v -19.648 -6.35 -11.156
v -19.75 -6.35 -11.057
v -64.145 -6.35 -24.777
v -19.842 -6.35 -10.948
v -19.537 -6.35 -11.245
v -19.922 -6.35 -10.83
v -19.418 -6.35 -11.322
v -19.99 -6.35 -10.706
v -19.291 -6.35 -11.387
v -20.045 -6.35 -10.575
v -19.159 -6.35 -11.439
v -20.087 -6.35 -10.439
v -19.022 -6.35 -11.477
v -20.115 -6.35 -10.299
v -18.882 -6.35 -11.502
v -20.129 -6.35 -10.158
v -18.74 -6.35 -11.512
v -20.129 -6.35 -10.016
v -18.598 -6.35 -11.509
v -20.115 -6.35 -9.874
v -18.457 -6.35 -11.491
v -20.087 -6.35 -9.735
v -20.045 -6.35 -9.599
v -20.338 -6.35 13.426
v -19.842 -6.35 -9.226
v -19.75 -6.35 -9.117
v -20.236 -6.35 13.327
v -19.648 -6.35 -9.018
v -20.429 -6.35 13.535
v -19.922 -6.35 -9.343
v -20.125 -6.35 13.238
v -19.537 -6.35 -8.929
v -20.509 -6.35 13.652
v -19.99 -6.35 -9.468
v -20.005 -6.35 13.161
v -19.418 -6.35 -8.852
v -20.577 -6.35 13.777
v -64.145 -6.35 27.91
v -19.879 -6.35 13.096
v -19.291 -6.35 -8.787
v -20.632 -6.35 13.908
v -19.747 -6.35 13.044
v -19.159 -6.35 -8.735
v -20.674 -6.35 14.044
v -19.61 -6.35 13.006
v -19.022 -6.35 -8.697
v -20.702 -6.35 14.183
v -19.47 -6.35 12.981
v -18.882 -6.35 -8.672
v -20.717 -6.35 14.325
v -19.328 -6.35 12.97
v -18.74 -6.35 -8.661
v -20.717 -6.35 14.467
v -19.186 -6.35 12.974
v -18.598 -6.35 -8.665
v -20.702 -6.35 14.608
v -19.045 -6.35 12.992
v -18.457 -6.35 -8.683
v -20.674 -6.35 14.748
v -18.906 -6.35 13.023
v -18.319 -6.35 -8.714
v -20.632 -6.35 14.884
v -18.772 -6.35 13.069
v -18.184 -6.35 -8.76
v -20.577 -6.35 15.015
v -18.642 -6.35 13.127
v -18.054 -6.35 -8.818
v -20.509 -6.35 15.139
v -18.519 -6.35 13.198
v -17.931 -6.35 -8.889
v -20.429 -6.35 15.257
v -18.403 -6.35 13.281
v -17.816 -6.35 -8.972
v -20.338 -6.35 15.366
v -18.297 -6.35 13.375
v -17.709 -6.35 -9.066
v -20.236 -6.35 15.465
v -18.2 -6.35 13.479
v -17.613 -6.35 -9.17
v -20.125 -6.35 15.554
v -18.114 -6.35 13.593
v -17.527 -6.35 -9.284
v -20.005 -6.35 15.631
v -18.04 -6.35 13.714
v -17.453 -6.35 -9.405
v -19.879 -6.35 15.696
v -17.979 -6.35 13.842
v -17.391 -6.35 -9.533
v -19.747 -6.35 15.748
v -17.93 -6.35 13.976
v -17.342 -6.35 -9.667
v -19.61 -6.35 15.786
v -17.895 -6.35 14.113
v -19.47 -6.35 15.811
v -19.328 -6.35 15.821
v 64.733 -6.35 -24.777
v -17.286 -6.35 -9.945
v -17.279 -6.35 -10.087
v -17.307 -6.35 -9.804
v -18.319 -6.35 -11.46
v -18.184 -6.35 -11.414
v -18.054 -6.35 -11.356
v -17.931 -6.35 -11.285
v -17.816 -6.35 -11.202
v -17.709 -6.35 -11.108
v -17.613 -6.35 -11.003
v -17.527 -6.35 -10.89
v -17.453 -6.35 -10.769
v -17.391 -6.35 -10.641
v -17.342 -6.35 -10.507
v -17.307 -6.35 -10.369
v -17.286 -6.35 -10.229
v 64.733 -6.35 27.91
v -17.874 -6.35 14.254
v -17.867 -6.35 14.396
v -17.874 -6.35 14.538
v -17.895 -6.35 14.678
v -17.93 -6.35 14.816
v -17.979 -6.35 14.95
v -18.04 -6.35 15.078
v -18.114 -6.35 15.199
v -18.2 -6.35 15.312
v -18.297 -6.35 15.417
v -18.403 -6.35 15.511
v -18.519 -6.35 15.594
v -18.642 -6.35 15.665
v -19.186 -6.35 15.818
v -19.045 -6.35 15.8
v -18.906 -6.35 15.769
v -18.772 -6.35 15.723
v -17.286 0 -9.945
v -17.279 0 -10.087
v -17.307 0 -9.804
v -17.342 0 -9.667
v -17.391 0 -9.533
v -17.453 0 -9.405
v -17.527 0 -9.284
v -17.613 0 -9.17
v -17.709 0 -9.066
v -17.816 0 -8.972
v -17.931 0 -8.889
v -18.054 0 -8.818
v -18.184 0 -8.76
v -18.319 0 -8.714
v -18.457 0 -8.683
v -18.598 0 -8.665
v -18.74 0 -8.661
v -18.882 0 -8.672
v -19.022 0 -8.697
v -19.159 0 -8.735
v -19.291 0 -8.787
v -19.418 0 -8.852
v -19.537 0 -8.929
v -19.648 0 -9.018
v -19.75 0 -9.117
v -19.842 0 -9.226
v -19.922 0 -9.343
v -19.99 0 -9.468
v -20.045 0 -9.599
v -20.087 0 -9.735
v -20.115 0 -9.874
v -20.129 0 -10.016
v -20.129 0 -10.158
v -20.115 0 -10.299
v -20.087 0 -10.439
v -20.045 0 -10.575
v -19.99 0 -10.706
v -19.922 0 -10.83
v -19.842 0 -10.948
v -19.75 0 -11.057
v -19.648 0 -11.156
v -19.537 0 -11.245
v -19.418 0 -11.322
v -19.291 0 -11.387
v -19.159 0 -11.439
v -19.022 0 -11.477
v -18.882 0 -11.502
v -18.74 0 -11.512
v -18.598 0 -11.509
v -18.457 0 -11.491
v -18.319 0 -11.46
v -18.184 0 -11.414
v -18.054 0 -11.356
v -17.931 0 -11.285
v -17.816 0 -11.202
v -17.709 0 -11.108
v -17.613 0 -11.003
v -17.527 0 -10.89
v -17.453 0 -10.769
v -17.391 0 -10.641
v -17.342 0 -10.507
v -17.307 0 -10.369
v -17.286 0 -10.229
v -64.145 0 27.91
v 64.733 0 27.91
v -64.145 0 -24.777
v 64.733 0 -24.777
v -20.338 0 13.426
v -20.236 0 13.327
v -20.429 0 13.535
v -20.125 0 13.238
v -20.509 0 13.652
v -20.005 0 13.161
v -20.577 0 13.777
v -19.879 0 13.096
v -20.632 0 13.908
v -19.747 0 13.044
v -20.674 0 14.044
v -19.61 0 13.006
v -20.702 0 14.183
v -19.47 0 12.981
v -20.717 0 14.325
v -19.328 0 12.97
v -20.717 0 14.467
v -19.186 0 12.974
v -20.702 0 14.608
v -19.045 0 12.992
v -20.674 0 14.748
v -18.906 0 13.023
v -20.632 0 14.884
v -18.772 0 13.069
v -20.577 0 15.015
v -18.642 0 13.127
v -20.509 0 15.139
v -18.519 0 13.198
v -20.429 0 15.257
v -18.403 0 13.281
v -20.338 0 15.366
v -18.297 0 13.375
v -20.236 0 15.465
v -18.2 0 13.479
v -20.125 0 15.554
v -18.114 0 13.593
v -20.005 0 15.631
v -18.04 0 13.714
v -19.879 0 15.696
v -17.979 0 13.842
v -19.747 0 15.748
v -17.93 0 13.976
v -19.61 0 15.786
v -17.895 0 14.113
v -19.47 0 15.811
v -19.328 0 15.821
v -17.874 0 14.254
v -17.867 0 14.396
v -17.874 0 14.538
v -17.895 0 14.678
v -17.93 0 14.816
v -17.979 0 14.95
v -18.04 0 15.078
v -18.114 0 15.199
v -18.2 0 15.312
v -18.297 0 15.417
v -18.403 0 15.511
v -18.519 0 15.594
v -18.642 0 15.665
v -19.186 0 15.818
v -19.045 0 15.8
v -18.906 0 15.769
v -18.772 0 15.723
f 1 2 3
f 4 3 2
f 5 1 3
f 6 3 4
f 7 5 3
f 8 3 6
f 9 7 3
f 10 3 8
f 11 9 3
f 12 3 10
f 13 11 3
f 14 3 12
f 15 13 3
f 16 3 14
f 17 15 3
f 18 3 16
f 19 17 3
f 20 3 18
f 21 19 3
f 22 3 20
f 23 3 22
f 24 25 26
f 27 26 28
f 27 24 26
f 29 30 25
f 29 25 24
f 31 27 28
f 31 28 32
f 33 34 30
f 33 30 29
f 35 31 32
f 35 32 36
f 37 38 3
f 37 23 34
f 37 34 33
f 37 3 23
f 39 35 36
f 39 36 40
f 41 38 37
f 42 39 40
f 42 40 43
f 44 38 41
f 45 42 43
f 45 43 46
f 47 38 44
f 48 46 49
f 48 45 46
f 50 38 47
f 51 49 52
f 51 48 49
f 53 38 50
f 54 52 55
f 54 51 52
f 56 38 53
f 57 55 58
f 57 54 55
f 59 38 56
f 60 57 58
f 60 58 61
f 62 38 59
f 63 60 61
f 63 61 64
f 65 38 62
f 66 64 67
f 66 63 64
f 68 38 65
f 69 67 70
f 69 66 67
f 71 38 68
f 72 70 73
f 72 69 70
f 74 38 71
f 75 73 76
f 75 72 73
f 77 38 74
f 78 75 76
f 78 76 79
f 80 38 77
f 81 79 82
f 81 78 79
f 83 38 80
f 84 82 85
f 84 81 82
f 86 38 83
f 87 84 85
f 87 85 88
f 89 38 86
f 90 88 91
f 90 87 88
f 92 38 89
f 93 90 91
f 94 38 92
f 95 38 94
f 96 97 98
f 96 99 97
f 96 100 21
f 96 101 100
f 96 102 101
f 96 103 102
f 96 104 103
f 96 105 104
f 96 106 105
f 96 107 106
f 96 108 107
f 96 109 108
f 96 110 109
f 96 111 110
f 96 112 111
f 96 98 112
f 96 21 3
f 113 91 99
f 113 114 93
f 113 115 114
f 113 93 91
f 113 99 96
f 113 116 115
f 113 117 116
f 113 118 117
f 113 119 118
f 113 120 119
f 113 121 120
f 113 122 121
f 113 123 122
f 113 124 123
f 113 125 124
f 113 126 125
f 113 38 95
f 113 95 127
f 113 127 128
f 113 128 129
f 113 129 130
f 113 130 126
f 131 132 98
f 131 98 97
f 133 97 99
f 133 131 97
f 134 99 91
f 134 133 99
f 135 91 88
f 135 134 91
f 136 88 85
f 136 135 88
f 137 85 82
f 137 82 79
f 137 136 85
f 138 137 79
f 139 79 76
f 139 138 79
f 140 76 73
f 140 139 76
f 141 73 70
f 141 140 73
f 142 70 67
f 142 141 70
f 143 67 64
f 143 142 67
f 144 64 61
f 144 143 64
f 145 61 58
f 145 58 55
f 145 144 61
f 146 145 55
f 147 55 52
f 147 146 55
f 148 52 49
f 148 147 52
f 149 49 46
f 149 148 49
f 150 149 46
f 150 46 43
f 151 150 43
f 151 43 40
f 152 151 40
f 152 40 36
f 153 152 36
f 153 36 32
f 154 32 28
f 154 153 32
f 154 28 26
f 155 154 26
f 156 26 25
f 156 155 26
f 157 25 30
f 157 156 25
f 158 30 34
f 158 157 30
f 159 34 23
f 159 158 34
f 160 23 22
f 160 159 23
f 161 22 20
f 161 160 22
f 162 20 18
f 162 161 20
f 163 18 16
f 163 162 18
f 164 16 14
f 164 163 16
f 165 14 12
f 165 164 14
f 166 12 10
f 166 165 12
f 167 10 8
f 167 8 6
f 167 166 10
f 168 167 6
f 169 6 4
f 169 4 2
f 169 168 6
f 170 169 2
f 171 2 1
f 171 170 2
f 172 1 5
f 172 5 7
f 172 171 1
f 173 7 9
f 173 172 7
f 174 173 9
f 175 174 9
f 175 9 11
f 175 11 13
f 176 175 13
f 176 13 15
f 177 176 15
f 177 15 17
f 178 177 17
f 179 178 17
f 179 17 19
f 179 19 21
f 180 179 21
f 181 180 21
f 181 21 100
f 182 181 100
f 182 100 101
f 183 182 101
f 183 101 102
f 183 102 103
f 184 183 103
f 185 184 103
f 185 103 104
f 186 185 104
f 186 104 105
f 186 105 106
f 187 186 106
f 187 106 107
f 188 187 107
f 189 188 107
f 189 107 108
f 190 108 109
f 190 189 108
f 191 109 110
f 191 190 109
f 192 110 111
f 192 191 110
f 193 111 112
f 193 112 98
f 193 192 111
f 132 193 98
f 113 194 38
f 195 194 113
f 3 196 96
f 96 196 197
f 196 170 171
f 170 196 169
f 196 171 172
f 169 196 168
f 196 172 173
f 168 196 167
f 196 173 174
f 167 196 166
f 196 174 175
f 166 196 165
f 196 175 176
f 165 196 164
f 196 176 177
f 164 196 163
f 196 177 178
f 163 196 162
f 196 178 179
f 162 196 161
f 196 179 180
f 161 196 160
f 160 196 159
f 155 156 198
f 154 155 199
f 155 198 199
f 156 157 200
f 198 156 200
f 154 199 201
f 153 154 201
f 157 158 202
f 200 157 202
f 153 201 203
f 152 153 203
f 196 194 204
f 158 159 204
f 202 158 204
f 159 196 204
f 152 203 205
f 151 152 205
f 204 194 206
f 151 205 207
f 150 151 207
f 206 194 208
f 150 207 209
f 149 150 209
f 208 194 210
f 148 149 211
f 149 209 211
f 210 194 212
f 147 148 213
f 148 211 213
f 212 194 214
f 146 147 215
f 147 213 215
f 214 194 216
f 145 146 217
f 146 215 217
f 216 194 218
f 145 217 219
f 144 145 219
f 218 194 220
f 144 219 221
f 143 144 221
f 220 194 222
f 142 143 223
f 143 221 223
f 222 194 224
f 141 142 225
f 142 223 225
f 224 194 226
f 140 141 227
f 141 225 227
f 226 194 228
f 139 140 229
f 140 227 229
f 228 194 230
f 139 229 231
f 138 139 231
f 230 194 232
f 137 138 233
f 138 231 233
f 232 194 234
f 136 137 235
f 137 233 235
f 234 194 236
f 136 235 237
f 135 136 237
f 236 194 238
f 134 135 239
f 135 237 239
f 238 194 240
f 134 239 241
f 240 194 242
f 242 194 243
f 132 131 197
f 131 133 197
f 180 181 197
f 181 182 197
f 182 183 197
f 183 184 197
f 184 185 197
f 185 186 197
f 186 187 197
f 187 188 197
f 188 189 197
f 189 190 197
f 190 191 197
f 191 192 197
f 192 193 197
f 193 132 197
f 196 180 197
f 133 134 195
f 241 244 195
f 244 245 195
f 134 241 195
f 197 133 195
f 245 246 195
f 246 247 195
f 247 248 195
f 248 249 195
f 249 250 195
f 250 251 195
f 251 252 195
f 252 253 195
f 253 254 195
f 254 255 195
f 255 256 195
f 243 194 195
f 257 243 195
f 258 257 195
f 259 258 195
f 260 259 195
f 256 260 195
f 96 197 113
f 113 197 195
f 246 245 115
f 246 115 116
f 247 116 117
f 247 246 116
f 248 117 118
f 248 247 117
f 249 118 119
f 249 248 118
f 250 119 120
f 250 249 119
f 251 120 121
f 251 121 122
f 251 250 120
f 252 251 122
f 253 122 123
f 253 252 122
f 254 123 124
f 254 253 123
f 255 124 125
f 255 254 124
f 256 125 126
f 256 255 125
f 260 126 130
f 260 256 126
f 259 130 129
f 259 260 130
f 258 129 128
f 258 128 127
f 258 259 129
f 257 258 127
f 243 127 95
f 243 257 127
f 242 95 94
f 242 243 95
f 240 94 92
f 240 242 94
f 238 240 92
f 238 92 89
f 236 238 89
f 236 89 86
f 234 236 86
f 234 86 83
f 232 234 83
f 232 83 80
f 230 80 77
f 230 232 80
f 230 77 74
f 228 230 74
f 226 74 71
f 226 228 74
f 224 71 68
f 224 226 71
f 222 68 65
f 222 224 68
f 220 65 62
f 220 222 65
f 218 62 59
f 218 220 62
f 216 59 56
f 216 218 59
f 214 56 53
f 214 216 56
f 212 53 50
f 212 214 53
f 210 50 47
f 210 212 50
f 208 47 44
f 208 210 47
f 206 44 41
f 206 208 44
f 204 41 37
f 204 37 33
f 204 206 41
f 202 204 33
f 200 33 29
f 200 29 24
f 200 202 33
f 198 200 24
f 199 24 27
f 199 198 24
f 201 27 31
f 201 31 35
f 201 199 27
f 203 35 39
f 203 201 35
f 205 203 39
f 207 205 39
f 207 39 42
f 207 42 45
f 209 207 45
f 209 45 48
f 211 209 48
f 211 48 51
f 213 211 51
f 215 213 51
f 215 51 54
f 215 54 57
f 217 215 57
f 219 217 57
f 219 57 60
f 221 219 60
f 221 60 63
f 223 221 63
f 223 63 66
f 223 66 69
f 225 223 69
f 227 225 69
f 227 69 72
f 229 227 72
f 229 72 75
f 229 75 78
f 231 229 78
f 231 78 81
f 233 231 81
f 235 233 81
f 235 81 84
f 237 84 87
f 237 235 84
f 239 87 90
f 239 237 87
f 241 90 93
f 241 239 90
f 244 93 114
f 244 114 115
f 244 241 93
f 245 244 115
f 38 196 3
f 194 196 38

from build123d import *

# Parameters (mm, degrees)
F0_W     = 128.877796
F0_H     = 52.687123
F0_R     = 1.425904
F0_R_2   = 16.772603
F0_R_3   = 16.75544
F0_R_4   = 1.425903
F1_DEPTH = 6.35


with BuildPart() as f1:
    # F0 (on Front) → F1 (new body)
    with BuildSketch(Plane.XZ):
        with Locations((0.293795, 1.566904)):
            Rectangle(F0_W, F0_H)
        with Locations((-18.704908, -10.08694)):
            Circle(F0_R, mode=Mode.SUBTRACT)
        with Locations((7.540722, 0)):
            Circle(F0_R_2, mode=Mode.SUBTRACT)
        with Locations((45.538131, 0)):
            Circle(F0_R_3, mode=Mode.SUBTRACT)
        with Locations((-19.292498, 14.395924)):
            Circle(F0_R_4, mode=Mode.SUBTRACT)
        with Locations((45.538131, 0)):
            Circle(F0_R_3)
        with Locations((7.540722, 0)):
            Circle(F0_R_2)
    extrude(amount=F1_DEPTH)


solid = f1.part
